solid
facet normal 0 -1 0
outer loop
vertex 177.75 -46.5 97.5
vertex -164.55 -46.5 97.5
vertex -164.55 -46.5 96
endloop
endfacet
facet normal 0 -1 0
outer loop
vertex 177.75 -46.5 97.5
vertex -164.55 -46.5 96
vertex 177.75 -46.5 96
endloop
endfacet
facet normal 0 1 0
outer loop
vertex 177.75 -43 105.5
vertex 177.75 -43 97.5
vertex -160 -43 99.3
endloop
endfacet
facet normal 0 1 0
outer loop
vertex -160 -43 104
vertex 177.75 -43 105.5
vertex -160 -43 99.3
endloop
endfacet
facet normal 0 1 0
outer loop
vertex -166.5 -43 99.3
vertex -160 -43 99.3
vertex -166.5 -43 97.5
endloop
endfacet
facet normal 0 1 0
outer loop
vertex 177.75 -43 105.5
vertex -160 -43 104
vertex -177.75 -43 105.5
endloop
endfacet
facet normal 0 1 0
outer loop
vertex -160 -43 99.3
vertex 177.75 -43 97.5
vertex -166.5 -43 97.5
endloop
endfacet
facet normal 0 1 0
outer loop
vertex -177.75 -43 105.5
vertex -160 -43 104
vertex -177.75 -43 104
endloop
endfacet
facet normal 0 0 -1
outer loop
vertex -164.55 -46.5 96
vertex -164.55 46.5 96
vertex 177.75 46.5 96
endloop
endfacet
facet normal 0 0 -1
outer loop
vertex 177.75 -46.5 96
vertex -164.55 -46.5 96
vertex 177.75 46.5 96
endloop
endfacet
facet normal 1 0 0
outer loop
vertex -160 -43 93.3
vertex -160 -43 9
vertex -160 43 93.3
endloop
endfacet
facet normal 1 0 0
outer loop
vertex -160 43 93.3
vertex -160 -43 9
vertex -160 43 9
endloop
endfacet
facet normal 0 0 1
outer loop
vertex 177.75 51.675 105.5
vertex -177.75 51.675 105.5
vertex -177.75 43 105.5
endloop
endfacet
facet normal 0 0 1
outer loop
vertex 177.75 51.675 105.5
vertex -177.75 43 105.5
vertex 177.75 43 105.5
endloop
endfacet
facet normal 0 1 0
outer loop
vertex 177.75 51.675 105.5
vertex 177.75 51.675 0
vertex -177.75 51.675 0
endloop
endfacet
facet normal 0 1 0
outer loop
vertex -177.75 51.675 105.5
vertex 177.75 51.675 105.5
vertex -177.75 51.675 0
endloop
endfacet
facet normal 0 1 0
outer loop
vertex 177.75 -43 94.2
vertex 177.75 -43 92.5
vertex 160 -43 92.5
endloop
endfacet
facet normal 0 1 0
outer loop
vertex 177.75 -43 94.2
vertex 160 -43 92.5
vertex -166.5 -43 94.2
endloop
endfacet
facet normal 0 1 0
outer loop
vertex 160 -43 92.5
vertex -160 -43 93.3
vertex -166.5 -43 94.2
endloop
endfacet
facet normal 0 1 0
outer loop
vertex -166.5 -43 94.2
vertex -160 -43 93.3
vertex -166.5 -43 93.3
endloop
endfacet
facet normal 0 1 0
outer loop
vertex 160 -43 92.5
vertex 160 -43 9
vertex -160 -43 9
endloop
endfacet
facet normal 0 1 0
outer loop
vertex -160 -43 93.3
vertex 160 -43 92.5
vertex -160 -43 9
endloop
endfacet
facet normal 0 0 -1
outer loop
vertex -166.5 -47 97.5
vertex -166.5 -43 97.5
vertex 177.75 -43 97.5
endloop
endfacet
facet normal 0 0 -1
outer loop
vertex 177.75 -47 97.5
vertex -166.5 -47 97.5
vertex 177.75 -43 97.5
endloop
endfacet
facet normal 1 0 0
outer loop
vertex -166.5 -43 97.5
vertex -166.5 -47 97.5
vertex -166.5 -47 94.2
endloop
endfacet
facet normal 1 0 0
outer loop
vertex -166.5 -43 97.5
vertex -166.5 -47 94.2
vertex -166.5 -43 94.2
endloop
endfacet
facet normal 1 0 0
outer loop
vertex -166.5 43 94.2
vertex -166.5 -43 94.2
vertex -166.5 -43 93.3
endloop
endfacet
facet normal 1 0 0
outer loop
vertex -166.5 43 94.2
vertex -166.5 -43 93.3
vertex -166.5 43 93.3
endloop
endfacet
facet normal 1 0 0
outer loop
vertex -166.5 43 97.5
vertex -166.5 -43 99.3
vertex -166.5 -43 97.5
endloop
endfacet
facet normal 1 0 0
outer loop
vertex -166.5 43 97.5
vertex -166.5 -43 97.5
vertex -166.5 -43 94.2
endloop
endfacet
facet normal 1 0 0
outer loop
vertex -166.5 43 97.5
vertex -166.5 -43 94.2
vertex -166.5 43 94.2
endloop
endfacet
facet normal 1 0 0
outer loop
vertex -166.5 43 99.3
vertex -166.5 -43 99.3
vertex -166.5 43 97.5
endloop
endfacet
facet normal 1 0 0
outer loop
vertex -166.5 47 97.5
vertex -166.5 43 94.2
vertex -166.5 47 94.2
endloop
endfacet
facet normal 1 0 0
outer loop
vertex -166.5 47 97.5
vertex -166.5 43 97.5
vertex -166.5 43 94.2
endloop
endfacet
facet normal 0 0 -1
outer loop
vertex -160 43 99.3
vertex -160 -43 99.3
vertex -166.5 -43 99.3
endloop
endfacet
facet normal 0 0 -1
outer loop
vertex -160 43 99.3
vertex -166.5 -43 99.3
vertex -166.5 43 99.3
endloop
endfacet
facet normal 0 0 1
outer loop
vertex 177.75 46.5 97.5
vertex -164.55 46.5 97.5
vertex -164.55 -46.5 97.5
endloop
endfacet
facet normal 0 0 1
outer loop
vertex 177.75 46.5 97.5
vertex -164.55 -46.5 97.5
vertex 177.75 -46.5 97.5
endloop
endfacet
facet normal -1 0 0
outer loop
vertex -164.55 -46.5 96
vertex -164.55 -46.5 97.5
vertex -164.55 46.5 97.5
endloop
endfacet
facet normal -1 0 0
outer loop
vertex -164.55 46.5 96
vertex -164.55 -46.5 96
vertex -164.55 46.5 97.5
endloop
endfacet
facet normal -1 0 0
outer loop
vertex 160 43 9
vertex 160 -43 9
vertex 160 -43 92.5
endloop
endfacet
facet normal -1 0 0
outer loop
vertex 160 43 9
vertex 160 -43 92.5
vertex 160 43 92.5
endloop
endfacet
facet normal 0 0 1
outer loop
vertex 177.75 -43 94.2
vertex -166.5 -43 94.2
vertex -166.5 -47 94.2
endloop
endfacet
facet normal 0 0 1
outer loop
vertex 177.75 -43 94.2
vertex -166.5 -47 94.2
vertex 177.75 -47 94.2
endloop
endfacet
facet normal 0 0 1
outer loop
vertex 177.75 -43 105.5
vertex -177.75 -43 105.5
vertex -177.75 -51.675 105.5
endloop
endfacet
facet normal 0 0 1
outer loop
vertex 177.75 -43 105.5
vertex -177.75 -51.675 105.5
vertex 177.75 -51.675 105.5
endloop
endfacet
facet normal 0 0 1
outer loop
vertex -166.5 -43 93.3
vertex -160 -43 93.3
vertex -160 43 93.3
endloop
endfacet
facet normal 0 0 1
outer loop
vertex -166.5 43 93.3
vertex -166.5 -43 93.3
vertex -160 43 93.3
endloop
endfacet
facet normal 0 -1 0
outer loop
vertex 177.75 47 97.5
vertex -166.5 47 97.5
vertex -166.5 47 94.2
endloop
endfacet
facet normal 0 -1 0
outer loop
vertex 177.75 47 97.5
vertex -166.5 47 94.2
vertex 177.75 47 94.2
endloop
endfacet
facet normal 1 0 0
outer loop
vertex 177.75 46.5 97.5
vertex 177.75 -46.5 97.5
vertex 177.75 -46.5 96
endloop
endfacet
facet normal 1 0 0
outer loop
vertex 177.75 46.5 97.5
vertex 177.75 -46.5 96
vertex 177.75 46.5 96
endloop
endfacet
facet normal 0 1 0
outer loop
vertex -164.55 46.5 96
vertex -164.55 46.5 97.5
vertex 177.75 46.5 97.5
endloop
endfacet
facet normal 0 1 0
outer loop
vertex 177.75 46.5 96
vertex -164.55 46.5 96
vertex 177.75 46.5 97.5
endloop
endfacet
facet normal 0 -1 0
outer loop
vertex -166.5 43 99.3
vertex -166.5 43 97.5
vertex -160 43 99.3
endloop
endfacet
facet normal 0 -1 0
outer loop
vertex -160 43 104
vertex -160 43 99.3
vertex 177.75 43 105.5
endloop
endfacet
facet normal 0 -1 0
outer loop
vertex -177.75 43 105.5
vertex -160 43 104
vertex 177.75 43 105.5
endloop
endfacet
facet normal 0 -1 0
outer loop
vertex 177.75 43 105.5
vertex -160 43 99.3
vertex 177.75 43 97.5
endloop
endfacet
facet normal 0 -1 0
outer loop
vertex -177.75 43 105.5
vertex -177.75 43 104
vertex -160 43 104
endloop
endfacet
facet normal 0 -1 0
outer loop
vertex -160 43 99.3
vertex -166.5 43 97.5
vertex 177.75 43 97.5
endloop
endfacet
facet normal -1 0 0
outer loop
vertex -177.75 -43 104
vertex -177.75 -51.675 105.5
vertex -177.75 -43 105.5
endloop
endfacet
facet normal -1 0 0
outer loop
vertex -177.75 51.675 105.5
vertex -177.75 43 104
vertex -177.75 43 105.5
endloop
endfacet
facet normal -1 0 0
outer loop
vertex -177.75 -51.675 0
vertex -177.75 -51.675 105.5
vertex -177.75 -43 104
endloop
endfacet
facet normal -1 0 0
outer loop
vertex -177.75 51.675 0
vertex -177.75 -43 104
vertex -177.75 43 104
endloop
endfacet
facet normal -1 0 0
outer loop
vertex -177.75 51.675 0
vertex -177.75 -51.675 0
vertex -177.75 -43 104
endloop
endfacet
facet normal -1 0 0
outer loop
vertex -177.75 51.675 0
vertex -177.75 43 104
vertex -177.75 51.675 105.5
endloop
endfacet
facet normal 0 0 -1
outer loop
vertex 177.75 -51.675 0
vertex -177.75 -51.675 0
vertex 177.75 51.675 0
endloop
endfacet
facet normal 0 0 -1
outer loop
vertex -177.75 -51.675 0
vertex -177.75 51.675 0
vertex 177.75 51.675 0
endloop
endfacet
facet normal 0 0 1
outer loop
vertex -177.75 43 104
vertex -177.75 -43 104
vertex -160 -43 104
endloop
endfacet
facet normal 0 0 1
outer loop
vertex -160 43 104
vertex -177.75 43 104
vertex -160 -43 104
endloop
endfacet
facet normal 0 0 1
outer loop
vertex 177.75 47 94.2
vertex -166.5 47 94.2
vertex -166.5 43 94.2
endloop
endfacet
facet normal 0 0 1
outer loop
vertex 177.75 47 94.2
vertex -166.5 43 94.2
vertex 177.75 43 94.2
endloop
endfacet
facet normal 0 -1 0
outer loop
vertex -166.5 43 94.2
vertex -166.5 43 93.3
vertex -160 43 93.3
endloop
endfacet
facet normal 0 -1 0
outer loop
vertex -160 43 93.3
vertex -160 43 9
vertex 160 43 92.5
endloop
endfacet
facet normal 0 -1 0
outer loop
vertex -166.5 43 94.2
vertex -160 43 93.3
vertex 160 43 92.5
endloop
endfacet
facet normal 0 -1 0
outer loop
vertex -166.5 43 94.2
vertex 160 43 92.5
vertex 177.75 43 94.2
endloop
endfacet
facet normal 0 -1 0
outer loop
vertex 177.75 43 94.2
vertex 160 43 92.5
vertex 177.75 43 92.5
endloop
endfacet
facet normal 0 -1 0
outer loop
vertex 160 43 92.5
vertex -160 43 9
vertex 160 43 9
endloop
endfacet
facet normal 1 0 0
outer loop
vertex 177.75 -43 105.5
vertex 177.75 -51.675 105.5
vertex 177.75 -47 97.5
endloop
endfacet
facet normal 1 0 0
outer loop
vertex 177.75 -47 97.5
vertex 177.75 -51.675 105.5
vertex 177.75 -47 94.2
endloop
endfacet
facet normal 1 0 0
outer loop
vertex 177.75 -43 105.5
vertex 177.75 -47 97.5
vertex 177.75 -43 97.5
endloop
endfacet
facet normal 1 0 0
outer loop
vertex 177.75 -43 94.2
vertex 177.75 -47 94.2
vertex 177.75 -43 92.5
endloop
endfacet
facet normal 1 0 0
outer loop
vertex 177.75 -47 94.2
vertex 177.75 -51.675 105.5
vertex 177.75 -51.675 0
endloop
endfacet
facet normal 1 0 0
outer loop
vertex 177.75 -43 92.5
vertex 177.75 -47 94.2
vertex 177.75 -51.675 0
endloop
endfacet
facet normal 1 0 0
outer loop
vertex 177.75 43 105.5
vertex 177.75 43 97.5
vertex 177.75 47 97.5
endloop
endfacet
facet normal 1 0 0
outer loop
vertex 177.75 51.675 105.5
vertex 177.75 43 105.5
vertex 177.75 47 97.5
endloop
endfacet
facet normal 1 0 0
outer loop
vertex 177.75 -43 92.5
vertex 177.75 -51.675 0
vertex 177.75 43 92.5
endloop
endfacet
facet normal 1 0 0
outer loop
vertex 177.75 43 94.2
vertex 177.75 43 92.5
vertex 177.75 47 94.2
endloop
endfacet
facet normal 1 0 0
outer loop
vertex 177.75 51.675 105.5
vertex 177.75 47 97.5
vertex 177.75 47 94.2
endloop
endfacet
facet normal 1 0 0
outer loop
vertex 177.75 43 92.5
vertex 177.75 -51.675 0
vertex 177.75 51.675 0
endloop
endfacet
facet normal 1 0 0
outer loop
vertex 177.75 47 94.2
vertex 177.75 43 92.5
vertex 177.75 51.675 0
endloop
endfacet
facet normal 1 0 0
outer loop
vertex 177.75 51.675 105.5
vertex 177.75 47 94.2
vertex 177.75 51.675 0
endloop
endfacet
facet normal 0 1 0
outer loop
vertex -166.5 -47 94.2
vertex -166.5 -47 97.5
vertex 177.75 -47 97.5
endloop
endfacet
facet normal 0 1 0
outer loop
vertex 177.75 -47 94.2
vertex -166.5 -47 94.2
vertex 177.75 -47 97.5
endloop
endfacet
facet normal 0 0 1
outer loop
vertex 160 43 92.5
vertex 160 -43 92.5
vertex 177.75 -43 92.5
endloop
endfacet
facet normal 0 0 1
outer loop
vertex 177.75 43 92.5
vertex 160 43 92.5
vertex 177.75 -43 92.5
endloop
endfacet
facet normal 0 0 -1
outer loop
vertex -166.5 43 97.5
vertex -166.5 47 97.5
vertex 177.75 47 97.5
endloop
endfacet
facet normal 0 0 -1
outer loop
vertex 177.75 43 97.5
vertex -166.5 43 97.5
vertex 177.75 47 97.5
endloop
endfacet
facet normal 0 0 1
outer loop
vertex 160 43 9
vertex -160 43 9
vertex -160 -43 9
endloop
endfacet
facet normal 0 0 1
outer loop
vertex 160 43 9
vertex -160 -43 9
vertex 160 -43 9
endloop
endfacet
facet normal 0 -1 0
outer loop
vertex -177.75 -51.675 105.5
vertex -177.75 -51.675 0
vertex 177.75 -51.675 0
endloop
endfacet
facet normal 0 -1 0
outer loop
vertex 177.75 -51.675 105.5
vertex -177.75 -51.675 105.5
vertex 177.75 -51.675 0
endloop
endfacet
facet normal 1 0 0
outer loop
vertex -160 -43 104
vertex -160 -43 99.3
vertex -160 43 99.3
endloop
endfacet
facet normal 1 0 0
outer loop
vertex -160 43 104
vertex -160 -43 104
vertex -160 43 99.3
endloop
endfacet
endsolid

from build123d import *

# Parameters (mm, degrees)
F0_W      = 320
F0_H      = 86
F1_DEPTH  = 9
F0_W_2    = 17.75
F2_DEPTH  = 92.5
F3_DEPTH  = 105.5
F4_DEPTH  = 104
F6_W      = 344.25
F6_H      = 94
F7_DEPTH  = 3.3
F8_W      = 86
F8_H      = 6
F9_DEPTH  = 6.5
F10_W     = 342.3
F10_H     = 93
F11_DEPTH = 1.5


with BuildPart() as f1:
    # F0 (on Top) → F1 (new body)
    with BuildSketch(Plane.XY):
        Rectangle(F0_W, F0_H)
    extrude(amount=F1_DEPTH)

    # F0 (on Top) → F2 (join)
    with BuildSketch(Plane.XY):
        with Locations((168.875, 0)):
            Rectangle(F0_W_2, F0_H)
    extrude(amount=F2_DEPTH)

    # F0 (on Top) → F3 (join)
    with BuildSketch(Plane.XY):
        Polygon((177.75, 51.675), (-177.75, 51.675), (-177.75, 43), (-160, 43), (160, 43), (177.75, 43), align=None)
        Polygon((-160, -43), (-177.75, -43), (-177.75, -51.675), (177.75, -51.675), (177.75, -43), (160, -43), align=None)
    extrude(amount=F3_DEPTH)

    # F0 (on Top) → F4 (join)
    with BuildSketch(Plane.XY):
        with Locations((-168.875, 0)):
            Rectangle(F0_W_2, F0_H)
    extrude(amount=F4_DEPTH)

    # F6 (on offset) → F7 (cut)
    with BuildSketch(Plane.XY.offset(97.5)):
        with Locations((5.625, 0)):
            Rectangle(F6_W, F6_H)
    extrude(amount=-F7_DEPTH, mode=Mode.SUBTRACT)

    # F8 (on face) → F9 (cut)
    with BuildSketch(Plane.YZ.offset(-160)):
        with Locations((0, 96.3)):
            Rectangle(F8_W, F8_H)
    extrude(amount=-F9_DEPTH, mode=Mode.SUBTRACT)


with BuildPart() as f11:
    # F10 (on offset) → F11 (new body)
    with BuildSketch(Plane.XY.offset(97.5)):
        with Locations((6.6, 0)):
            Rectangle(F10_W, F10_H)
    extrude(amount=-F11_DEPTH)


solid = Compound([f1.part, f11.part])
